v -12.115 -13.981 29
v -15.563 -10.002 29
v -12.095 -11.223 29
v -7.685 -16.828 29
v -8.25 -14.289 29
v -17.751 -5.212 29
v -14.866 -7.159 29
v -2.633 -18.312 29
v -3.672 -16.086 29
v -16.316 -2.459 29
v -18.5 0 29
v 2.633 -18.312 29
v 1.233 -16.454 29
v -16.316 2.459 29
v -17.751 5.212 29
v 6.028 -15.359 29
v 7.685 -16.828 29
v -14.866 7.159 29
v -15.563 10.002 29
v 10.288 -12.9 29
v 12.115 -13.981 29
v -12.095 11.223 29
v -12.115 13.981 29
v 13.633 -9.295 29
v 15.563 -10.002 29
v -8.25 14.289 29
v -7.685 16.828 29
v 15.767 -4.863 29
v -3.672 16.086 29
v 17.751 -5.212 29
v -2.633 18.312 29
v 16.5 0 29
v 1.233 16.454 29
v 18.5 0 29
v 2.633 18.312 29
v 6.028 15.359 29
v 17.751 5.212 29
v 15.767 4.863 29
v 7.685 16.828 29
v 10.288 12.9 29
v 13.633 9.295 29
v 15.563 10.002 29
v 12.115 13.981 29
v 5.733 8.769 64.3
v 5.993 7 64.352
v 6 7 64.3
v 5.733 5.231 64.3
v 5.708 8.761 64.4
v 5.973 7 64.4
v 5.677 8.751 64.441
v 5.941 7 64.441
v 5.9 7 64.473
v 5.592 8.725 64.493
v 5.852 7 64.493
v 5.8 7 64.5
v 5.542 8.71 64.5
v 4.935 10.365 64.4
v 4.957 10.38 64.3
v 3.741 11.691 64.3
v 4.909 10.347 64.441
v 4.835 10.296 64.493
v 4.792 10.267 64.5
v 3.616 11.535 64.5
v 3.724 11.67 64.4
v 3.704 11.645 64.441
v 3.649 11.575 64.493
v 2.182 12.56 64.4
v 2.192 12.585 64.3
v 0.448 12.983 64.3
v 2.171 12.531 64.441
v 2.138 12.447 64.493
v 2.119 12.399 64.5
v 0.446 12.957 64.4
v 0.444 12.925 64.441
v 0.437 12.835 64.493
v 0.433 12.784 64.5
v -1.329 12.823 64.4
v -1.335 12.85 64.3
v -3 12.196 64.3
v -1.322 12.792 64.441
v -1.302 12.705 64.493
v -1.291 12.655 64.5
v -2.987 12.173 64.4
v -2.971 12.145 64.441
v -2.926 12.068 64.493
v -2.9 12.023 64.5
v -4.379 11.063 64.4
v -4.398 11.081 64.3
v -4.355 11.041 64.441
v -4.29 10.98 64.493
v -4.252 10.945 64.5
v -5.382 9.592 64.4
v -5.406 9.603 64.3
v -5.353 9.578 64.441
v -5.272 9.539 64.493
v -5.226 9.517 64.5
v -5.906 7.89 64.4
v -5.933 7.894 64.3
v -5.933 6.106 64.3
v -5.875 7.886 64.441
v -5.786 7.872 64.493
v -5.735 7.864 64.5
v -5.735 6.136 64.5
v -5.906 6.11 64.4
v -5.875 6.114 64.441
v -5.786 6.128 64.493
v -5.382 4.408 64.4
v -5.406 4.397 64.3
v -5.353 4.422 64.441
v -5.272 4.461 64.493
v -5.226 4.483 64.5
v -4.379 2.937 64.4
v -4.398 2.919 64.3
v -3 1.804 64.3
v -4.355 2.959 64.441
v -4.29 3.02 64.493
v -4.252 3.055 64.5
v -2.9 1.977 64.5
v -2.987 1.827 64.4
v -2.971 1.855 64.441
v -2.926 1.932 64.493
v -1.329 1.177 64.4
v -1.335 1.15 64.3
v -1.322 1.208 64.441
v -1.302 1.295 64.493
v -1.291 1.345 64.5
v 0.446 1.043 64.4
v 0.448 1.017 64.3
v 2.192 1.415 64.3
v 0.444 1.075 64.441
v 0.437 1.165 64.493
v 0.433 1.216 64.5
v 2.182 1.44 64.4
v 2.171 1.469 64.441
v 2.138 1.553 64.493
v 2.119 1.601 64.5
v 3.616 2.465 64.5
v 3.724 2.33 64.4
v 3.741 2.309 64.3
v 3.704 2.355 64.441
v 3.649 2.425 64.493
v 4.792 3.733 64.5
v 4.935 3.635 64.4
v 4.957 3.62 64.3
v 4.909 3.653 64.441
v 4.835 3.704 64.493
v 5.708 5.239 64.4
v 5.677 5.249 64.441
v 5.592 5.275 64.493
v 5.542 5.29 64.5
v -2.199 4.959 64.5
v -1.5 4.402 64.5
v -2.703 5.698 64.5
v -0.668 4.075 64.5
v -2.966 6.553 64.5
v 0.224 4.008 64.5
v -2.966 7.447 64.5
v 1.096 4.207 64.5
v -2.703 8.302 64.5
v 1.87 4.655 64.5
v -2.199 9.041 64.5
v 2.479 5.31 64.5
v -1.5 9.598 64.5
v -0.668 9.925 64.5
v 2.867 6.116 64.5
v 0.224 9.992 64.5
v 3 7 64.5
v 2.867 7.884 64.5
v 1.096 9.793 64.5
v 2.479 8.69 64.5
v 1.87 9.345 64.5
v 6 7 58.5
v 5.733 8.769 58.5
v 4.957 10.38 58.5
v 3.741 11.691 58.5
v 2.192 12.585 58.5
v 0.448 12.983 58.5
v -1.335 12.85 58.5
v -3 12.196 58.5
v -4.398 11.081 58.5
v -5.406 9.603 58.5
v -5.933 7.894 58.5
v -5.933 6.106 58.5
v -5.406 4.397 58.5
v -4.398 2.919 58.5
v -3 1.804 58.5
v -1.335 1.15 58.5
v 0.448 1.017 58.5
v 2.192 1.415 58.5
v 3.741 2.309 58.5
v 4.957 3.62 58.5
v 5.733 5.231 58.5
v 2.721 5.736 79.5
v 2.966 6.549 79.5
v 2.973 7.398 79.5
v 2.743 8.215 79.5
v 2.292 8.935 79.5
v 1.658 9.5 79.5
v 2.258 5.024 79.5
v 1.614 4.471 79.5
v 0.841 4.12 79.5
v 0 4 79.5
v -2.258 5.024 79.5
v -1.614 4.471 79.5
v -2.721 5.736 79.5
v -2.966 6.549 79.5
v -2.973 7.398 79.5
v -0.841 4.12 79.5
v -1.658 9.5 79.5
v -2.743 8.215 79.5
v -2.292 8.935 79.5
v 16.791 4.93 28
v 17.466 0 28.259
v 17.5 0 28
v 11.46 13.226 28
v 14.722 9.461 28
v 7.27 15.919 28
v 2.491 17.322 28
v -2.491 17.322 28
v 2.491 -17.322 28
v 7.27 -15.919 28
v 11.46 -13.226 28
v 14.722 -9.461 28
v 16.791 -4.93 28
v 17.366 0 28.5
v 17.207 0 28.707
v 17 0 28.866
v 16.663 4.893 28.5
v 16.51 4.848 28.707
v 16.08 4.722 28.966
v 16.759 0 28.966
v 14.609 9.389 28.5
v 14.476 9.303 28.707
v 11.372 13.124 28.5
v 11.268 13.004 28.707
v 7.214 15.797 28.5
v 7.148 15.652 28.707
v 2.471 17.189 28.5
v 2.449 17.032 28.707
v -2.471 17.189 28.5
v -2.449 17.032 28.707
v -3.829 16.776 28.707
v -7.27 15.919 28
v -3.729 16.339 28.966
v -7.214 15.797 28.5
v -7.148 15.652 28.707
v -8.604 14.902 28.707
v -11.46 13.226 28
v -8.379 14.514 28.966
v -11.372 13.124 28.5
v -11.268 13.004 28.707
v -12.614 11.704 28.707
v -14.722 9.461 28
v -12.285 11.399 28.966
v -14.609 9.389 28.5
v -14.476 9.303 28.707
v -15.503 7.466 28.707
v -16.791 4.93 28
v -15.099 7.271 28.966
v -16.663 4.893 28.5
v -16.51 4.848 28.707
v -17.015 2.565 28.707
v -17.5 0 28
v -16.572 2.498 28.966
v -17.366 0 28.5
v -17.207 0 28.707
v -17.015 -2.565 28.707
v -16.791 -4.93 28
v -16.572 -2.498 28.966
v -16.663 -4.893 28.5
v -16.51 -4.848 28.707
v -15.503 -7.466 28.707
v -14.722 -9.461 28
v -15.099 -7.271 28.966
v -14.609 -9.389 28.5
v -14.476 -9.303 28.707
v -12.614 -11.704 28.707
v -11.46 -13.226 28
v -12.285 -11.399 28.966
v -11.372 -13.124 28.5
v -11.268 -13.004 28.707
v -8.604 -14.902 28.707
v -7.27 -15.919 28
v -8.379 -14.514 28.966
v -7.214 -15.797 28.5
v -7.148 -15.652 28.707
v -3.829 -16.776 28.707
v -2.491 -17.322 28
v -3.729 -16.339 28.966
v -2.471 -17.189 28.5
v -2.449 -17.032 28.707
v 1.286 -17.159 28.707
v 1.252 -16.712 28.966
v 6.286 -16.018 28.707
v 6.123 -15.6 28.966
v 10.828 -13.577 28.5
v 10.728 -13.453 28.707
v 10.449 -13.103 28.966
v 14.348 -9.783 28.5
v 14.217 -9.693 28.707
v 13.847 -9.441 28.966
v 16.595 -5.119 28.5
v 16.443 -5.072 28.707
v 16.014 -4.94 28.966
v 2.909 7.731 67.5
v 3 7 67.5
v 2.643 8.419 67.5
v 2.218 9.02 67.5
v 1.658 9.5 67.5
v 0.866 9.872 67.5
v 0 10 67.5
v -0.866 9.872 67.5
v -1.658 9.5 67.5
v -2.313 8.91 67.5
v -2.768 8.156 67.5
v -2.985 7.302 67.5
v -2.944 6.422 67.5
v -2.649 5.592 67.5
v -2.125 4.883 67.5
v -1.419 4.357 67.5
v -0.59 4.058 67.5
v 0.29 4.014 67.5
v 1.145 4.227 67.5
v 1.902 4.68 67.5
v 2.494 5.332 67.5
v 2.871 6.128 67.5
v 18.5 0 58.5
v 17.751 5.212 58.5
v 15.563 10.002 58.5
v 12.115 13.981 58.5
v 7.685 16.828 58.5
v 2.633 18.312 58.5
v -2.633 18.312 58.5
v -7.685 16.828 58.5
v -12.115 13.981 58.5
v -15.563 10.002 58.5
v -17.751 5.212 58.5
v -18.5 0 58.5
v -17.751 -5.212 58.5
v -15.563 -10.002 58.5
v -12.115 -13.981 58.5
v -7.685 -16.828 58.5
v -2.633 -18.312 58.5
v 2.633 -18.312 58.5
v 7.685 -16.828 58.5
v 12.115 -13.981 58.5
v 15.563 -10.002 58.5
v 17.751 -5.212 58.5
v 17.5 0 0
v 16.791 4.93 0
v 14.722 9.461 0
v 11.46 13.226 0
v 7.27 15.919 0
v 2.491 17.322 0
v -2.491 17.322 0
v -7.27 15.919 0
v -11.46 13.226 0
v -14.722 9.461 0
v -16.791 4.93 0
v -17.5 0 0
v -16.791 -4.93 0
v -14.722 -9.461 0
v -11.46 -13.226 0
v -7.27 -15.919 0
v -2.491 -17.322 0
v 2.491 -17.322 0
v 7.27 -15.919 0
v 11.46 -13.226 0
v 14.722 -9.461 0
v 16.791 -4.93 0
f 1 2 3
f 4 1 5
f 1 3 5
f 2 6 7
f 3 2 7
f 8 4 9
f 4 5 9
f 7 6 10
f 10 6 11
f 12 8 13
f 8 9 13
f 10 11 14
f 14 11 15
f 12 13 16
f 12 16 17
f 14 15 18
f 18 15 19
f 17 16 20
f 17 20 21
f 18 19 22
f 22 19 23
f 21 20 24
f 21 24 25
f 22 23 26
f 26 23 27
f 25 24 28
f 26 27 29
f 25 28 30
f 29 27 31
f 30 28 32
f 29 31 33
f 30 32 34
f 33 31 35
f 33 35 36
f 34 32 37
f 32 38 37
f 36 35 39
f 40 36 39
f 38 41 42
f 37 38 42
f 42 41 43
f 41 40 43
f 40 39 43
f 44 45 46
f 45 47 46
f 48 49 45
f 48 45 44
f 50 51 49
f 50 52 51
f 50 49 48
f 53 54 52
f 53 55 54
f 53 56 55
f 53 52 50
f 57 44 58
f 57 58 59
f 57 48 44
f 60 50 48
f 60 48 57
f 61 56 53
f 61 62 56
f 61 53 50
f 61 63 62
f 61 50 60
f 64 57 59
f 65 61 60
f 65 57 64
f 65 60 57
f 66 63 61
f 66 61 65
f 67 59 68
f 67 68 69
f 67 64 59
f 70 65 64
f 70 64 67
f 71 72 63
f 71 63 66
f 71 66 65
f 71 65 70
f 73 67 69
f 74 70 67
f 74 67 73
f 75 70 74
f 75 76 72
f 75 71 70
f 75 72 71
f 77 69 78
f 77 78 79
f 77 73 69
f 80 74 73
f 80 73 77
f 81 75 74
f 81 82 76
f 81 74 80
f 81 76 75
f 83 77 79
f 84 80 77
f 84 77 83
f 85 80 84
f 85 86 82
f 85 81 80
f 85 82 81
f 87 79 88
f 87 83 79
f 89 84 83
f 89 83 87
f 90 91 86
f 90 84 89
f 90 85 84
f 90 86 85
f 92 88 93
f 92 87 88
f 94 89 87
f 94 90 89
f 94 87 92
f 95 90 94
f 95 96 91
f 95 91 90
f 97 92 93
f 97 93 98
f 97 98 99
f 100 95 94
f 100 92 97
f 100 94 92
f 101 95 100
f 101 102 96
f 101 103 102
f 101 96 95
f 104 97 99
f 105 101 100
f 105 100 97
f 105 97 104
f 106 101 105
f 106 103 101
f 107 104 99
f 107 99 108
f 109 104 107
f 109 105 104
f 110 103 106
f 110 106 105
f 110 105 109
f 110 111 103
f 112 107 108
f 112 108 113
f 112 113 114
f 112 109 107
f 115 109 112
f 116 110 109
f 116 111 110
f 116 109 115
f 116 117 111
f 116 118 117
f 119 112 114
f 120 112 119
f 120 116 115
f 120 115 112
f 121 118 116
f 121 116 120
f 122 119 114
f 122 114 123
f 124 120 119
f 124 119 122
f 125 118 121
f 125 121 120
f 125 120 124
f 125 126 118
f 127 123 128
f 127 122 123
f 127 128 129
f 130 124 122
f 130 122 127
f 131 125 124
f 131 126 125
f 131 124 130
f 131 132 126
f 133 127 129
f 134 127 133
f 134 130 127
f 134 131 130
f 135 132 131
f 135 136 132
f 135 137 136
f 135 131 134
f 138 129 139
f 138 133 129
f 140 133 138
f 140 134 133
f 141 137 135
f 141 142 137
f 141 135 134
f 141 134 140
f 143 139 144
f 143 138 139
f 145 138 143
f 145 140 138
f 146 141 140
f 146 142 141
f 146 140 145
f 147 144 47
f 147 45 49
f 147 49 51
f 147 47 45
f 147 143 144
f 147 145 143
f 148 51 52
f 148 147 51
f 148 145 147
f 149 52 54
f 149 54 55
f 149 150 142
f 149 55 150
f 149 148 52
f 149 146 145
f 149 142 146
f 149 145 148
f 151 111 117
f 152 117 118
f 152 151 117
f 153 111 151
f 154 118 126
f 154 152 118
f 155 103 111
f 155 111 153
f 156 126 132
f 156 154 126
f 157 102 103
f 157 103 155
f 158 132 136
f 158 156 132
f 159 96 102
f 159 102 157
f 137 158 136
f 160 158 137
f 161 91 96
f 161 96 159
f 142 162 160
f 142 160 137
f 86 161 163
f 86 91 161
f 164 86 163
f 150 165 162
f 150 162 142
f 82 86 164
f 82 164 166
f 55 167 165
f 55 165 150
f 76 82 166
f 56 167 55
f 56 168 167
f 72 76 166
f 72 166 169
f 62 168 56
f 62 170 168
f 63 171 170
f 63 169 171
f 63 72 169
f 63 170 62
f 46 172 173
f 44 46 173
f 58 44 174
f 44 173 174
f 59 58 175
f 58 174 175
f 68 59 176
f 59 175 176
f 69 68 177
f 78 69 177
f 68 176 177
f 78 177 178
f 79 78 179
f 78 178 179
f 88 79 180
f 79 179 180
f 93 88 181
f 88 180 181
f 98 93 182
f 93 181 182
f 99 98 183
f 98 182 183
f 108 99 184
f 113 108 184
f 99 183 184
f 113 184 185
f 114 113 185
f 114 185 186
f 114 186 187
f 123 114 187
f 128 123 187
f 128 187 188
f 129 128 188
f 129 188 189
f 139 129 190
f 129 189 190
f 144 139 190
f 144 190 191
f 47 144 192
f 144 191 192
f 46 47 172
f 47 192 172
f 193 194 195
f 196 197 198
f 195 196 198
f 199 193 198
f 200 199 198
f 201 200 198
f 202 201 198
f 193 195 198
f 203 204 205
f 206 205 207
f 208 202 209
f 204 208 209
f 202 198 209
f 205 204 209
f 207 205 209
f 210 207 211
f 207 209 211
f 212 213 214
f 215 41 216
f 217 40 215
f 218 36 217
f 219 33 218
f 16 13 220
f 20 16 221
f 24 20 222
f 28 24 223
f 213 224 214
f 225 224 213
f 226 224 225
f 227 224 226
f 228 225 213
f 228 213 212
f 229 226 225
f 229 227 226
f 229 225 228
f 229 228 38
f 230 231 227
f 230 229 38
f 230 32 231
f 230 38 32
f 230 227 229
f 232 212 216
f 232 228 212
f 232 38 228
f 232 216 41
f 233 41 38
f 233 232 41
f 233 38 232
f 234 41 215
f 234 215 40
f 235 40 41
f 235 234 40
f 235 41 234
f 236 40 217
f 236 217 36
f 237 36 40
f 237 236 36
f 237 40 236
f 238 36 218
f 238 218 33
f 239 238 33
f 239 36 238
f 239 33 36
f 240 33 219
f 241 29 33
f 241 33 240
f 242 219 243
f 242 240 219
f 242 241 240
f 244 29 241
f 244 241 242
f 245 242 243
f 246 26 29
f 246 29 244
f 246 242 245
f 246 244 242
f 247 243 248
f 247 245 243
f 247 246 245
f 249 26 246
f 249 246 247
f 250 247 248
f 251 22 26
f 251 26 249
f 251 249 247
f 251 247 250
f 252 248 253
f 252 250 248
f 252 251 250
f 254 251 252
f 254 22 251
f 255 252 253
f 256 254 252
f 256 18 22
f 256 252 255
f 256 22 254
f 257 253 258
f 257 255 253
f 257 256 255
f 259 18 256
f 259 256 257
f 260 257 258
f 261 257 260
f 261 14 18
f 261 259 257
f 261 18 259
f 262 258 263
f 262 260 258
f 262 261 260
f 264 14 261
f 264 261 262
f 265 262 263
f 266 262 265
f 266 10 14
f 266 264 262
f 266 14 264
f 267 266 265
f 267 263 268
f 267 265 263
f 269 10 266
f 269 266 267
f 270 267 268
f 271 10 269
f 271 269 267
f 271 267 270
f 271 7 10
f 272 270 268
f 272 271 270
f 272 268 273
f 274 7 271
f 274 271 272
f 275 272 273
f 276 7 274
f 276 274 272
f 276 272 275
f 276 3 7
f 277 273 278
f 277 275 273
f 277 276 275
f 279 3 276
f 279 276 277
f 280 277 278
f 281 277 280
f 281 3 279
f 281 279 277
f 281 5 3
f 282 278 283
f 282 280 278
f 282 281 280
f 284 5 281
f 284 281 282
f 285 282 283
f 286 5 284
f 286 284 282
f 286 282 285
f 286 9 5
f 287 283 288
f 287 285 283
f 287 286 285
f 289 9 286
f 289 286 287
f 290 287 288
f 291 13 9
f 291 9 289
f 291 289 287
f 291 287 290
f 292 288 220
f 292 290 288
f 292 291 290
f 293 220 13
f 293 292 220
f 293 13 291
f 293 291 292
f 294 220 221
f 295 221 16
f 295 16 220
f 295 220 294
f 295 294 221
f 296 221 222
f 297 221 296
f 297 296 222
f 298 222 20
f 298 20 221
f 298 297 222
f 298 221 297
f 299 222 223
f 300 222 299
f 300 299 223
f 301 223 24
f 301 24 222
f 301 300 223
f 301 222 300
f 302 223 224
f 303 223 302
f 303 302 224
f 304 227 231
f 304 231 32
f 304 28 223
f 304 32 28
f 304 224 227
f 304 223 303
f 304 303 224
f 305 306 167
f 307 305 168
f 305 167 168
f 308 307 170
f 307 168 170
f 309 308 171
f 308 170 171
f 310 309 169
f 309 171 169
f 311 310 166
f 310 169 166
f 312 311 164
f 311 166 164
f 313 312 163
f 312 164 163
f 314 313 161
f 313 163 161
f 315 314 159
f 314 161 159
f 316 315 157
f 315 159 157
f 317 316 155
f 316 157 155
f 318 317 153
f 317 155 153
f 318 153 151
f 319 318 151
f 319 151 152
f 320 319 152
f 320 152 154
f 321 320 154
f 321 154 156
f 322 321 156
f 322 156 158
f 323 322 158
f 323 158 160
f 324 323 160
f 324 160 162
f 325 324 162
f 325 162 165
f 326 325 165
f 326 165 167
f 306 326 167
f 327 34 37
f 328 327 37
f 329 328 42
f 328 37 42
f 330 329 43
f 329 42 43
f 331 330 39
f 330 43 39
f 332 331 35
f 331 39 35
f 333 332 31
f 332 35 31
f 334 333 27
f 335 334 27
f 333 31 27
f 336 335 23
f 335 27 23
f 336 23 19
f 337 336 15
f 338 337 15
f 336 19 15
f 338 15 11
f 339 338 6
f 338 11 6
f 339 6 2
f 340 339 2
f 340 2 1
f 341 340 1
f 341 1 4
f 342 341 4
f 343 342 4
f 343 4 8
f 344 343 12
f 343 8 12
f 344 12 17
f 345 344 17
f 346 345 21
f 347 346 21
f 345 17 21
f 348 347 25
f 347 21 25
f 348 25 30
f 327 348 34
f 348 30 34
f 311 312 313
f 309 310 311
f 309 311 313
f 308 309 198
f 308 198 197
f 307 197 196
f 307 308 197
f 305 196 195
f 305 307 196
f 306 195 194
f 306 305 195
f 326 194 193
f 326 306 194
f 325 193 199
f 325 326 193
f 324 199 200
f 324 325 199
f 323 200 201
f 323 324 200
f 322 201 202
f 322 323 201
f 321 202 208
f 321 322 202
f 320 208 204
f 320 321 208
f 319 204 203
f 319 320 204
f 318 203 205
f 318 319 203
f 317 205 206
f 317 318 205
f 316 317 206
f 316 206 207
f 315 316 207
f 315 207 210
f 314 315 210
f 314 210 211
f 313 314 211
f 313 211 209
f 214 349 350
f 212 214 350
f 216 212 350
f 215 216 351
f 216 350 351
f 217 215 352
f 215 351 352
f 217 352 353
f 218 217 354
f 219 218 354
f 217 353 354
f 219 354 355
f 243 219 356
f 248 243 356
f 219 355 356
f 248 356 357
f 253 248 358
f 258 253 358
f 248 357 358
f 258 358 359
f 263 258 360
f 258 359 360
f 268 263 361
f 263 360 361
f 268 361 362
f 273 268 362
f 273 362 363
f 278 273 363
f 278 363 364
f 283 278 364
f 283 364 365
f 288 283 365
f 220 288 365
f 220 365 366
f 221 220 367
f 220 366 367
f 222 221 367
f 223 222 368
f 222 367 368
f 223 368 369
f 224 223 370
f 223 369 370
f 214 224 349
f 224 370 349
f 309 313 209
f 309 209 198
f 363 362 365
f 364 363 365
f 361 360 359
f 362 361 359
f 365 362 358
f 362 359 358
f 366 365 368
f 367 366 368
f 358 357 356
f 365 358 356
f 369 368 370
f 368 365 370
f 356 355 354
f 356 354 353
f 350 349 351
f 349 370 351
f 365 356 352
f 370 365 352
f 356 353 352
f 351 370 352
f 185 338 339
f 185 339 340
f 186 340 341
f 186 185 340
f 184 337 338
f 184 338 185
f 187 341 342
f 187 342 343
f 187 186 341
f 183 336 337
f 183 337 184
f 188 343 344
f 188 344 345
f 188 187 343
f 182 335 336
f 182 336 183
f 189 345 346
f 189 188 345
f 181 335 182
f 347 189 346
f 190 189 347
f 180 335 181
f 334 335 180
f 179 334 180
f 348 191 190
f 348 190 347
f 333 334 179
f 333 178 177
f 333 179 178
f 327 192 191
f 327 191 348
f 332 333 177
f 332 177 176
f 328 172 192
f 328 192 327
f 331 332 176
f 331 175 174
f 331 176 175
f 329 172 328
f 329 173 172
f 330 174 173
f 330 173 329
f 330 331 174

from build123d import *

# Parameters (mm, degrees)
SKETCH2_R           = 17.5
BOSS_EXTRUDE2_DEPTH = 29
FILLET2_R           = 1
SKETCH3_R           = 18.5
BOSS_EXTRUDE3_DEPTH = 29.5
SKETCH4_R           = 6
BOSS_EXTRUDE4_DEPTH = 6
FILLET6_R           = 0.2
SKETCH5_R           = 3
BOSS_EXTRUDE5_DEPTH = 3
BOSS_EXTRUDE6_DEPTH = 12


with BuildPart() as part:
    # Sketch2 → Boss-Extrude2 (new body)
    with BuildSketch(Plane.XY):
        Circle(SKETCH2_R)
    extrude(amount=BOSS_EXTRUDE2_DEPTH)

    # Fillet2
    fillet2_edges = [part.edges().sort_by_distance(p)[0] for p in [
        (-17.5, 0, 29),
    ]]
    fillet(fillet2_edges, radius=FILLET2_R)

    # Sketch3 → Boss-Extrude3 (add)
    with BuildSketch(Plane.XY.offset(29)):
        Circle(SKETCH3_R)
    extrude(amount=BOSS_EXTRUDE3_DEPTH)

    # Sketch4 → Boss-Extrude4 (add)
    with BuildSketch(Plane.XY.offset(58.5)):
        with Locations((0, 7)):
            Circle(SKETCH4_R)
    extrude(amount=BOSS_EXTRUDE4_DEPTH)

    # Fillet6
    fillet6_edges = [part.edges().sort_by_distance(p)[0] for p in [
        (-6, 7, 64.5),
    ]]
    fillet(fillet6_edges, radius=FILLET6_R)

    # Sketch5 → Boss-Extrude5 (add)
    with BuildSketch(Plane.XY.offset(64.5)):
        with Locations((0, 7)):
            Circle(SKETCH5_R)
    extrude(amount=BOSS_EXTRUDE5_DEPTH)

    # Sketch6 → Boss-Extrude6 (add)
    with BuildSketch(Plane.XY.offset(67.5)):
        with BuildLine():
            Line((-1.658312395, 9.5), (1.658312395, 9.5))
            ThreePointArc((1.658312395, 9.5), (0, 4), (-1.658312395, 9.5))
        make_face()
    extrude(amount=BOSS_EXTRUDE6_DEPTH)


solid = part.part
